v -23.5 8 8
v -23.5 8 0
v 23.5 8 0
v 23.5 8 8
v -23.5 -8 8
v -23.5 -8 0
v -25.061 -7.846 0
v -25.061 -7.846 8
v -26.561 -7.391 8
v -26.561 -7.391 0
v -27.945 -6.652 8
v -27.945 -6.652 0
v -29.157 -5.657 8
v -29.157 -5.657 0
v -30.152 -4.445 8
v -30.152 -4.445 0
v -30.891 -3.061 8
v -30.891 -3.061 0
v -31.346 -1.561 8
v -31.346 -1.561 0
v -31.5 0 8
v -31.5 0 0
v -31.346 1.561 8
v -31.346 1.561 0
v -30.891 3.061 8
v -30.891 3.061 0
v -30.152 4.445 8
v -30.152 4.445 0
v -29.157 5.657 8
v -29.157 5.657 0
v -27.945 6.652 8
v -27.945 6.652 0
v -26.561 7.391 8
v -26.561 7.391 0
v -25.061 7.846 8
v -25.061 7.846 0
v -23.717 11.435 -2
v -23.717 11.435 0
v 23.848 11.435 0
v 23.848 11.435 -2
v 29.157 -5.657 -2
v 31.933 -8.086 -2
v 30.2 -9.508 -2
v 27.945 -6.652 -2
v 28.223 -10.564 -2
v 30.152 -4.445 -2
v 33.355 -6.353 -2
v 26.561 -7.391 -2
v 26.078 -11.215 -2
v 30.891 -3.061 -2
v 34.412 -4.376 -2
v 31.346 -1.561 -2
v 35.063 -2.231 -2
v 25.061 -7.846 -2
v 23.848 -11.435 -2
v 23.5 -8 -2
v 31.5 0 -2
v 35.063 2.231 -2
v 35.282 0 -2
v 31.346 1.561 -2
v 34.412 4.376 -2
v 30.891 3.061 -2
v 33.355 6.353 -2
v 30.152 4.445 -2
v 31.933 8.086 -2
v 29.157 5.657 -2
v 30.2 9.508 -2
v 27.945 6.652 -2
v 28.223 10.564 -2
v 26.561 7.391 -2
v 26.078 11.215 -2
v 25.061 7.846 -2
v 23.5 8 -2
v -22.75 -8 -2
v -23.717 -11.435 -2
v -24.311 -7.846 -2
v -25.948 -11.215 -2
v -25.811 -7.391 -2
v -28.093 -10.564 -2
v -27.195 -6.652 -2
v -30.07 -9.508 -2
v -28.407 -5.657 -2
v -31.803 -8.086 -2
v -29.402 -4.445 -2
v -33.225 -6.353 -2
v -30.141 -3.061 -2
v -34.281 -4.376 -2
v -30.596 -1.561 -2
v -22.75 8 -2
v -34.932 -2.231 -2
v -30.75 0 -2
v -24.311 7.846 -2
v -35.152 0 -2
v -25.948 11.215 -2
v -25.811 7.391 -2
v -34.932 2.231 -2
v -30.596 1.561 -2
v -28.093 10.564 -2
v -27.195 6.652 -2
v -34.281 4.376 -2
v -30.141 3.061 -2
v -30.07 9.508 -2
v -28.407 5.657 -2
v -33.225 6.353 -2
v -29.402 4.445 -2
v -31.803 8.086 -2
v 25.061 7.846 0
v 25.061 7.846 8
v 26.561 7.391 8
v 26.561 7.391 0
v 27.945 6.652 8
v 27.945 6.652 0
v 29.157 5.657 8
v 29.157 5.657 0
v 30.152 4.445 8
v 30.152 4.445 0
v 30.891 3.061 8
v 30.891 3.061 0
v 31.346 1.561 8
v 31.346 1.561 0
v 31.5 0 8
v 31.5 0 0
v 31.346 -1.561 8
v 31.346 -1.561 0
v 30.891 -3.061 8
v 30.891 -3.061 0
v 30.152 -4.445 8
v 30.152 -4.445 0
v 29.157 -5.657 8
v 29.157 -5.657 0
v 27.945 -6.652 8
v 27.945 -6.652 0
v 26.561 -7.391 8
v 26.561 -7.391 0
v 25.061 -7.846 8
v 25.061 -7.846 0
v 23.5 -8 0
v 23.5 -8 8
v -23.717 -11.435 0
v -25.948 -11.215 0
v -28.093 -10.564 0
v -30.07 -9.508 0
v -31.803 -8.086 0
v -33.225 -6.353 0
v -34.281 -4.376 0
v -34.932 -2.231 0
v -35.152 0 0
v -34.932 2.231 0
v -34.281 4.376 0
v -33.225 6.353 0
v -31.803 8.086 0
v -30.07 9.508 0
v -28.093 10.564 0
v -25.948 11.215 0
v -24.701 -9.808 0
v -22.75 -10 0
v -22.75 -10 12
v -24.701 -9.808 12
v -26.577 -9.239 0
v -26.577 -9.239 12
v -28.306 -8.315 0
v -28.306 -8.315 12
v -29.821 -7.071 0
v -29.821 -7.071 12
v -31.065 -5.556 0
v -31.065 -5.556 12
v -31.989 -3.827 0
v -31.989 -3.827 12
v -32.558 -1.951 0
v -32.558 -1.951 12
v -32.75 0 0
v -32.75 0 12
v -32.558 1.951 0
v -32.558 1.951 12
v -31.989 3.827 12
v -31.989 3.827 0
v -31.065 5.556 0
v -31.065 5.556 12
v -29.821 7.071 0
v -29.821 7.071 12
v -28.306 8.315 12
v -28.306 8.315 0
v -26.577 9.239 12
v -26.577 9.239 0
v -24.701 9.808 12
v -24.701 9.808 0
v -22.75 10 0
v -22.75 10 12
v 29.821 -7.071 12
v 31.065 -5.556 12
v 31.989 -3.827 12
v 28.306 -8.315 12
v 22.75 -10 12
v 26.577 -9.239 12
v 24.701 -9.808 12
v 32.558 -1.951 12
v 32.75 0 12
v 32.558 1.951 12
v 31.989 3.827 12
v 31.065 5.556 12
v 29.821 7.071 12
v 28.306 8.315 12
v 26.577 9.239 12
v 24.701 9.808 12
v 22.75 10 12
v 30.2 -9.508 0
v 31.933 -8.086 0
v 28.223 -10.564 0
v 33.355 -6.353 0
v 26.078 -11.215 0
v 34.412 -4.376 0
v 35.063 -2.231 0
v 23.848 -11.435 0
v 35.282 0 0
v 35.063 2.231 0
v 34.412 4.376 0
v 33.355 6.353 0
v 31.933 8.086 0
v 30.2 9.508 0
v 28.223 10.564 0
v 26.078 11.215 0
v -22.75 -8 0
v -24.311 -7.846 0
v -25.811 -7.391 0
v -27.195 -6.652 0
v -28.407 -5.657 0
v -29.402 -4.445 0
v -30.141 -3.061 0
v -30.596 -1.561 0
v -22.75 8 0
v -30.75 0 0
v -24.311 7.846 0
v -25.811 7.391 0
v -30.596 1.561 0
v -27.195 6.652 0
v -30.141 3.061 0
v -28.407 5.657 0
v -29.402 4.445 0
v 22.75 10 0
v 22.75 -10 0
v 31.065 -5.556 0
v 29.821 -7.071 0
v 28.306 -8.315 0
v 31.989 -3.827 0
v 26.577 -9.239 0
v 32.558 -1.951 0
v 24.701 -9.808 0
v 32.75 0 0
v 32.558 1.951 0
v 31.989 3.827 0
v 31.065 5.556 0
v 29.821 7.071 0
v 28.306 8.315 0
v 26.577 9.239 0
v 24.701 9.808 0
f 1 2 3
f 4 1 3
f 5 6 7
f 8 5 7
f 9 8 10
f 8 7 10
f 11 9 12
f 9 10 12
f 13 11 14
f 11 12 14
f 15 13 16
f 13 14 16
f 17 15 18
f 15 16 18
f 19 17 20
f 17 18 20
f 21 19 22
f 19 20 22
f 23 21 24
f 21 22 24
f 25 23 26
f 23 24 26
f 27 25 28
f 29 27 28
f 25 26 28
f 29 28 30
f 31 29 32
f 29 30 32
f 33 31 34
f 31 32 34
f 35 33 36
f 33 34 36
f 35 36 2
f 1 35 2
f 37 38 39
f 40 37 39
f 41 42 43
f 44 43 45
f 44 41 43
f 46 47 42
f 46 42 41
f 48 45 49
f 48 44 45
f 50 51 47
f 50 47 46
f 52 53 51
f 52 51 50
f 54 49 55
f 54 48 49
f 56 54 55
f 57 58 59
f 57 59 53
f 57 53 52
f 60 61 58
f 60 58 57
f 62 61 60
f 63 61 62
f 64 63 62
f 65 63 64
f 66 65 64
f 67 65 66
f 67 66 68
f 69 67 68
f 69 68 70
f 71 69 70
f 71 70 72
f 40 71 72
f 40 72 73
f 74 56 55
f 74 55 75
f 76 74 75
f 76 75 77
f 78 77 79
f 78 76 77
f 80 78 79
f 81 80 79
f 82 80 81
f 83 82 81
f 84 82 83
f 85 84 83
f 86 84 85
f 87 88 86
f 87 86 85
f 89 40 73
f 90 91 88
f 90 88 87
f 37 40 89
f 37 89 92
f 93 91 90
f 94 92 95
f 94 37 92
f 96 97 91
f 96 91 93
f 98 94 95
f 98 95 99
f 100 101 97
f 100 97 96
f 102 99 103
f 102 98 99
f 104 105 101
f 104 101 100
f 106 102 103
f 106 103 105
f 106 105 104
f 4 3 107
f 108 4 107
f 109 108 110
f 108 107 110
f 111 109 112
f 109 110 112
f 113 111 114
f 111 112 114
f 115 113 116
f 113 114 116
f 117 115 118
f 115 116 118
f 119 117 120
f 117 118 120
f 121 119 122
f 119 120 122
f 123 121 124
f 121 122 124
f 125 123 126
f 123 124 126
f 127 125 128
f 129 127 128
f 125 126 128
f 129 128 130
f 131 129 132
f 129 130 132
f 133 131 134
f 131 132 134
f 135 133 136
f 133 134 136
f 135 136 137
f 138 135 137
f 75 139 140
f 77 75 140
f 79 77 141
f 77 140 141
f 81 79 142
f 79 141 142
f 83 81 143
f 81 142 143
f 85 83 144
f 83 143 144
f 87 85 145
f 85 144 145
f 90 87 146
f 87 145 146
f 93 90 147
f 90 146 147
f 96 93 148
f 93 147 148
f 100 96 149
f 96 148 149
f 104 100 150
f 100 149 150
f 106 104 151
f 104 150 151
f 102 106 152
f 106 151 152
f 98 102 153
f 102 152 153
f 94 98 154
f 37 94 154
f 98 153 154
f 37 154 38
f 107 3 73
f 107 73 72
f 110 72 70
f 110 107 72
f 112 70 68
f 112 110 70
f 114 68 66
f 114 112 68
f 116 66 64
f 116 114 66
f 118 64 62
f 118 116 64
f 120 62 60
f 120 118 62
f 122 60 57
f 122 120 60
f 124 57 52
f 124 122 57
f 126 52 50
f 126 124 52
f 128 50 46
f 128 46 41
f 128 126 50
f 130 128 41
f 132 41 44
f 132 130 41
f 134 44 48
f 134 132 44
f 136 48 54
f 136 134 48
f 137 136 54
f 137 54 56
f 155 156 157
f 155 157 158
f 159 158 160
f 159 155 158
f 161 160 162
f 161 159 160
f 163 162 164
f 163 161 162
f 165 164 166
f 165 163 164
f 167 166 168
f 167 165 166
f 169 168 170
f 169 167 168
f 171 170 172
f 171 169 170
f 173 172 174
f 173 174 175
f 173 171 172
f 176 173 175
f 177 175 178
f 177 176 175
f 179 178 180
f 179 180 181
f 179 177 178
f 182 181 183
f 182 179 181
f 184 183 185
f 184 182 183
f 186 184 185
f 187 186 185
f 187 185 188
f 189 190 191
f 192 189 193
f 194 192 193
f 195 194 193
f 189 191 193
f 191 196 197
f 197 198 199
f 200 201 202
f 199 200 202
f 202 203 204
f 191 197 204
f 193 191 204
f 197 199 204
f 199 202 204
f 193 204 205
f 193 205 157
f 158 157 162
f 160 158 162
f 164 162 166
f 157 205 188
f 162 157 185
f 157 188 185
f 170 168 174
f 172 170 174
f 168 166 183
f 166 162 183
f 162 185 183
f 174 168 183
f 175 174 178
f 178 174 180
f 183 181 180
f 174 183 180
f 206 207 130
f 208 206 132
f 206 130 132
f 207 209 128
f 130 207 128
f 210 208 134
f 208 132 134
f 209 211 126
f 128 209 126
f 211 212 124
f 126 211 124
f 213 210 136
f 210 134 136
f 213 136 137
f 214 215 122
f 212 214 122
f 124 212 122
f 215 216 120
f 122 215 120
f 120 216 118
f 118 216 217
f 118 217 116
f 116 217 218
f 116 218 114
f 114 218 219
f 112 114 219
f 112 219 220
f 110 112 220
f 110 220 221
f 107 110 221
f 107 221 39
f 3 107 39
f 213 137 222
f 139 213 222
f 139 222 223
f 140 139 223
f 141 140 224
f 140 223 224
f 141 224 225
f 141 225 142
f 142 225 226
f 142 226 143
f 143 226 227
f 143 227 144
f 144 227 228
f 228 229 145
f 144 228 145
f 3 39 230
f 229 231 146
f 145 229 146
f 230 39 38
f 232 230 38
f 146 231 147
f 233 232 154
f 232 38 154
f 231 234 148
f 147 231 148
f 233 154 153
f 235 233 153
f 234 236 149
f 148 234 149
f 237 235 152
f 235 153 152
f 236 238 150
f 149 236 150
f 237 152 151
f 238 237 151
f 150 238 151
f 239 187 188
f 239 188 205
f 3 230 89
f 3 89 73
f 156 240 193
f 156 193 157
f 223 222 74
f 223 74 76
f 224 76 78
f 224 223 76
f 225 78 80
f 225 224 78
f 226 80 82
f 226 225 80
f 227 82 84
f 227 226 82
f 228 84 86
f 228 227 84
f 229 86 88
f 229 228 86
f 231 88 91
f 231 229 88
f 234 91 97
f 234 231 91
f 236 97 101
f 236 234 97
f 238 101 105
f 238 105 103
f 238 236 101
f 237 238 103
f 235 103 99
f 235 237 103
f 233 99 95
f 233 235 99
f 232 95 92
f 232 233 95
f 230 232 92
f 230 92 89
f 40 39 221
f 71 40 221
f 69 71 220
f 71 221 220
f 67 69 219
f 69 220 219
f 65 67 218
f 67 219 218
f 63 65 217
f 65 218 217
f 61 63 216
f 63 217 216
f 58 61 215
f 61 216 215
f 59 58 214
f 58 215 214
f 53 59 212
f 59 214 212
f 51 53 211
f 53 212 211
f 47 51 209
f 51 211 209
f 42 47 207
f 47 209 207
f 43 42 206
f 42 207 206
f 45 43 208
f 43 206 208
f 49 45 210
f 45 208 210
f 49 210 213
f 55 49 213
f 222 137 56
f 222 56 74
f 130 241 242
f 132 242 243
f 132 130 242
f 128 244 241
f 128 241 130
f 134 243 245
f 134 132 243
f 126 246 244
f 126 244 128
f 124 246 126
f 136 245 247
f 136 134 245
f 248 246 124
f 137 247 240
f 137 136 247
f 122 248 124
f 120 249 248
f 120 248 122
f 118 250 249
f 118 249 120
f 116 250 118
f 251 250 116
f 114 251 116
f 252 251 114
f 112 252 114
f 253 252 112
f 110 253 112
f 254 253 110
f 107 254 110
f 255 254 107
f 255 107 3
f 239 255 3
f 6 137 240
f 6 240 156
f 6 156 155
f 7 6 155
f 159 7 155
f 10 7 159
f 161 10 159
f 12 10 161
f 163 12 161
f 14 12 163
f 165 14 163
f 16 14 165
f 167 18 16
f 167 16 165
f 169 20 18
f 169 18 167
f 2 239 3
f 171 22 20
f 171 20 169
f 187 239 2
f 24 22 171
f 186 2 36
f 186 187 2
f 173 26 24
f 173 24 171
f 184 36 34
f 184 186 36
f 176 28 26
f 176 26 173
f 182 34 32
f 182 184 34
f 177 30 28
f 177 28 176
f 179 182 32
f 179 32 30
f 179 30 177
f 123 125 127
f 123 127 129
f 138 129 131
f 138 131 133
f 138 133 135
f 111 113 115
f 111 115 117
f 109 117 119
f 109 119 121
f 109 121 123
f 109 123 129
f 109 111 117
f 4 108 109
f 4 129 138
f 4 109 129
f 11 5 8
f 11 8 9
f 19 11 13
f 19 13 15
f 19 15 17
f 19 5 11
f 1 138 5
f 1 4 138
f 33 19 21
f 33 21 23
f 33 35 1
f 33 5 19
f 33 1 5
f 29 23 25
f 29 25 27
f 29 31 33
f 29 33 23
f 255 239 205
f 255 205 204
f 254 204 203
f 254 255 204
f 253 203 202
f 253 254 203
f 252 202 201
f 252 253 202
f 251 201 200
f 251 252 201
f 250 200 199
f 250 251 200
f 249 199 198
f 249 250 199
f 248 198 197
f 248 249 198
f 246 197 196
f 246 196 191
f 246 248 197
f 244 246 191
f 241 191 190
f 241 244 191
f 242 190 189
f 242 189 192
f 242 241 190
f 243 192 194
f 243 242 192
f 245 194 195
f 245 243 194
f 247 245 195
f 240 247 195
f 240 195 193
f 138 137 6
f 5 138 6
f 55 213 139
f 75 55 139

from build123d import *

# Parameters (mm, degrees)
BOSS_EXTRUDE1_DEPTH = 12
CUT_EXTRUDE1_DEPTH  = 8
BOSS_EXTRUDE2_START = -12
BOSS_EXTRUDE2_DEPTH = 2


with BuildPart() as part:
    # Sketch1 → Boss-Extrude1 (new body)
    with BuildSketch(Plane.XY):
        with BuildLine():
            Line((-22.75, 10), (22.75, 10))
            ThreePointArc((22.75, 10), (32.75, 0), (22.75, -10))
            Line((22.75, -10), (-22.75, -10))
            ThreePointArc((-22.75, -10), (-32.75, 0), (-22.75, 10))
        make_face()
    extrude(amount=BOSS_EXTRUDE1_DEPTH)

    # Sketch2 → Cut-Extrude1 (cut)
    with BuildSketch(Plane.XY):
        with BuildLine():
            Line((-23.5, 8), (23.5, 8))
            ThreePointArc((23.5, 8), (31.5, 0), (23.5, -8))
            Line((23.5, -8), (-23.5, -8))
            ThreePointArc((-23.5, -8), (-31.5, 0), (-23.5, 8))
        make_face()
    extrude(amount=CUT_EXTRUDE1_DEPTH, mode=Mode.SUBTRACT)


with BuildPart() as body_2:
    # Sketch3 → Boss-Extrude2 (new body)
    with BuildSketch(Plane.XY.offset(12).offset(BOSS_EXTRUDE2_START)):
        with BuildLine():
            Line((-23.717058044, 11.43482794), (23.847510299, 11.43482794))
            ThreePointArc((23.847510299, 11.43482794), (35.28233824, 0), (23.847510299, -11.43482794))
            Line((23.847510299, -11.43482794), (-23.717058044, -11.43482794))
            ThreePointArc((-23.717058044, -11.43482794), (-35.151885985, 0), (-23.717058044, 11.43482794))
        make_face()
        with BuildLine():
            Line((-22.75, 8), (23.5, 8))
            ThreePointArc((23.5, 8), (31.5, 0), (23.5, -8))
            Line((23.5, -8), (-22.75, -8))
            ThreePointArc((-22.75, -8), (-30.75, 0), (-22.75, 8))
        make_face(mode=Mode.SUBTRACT)
    extrude(amount=-BOSS_EXTRUDE2_DEPTH)


solid = Compound([part.part, body_2.part])
